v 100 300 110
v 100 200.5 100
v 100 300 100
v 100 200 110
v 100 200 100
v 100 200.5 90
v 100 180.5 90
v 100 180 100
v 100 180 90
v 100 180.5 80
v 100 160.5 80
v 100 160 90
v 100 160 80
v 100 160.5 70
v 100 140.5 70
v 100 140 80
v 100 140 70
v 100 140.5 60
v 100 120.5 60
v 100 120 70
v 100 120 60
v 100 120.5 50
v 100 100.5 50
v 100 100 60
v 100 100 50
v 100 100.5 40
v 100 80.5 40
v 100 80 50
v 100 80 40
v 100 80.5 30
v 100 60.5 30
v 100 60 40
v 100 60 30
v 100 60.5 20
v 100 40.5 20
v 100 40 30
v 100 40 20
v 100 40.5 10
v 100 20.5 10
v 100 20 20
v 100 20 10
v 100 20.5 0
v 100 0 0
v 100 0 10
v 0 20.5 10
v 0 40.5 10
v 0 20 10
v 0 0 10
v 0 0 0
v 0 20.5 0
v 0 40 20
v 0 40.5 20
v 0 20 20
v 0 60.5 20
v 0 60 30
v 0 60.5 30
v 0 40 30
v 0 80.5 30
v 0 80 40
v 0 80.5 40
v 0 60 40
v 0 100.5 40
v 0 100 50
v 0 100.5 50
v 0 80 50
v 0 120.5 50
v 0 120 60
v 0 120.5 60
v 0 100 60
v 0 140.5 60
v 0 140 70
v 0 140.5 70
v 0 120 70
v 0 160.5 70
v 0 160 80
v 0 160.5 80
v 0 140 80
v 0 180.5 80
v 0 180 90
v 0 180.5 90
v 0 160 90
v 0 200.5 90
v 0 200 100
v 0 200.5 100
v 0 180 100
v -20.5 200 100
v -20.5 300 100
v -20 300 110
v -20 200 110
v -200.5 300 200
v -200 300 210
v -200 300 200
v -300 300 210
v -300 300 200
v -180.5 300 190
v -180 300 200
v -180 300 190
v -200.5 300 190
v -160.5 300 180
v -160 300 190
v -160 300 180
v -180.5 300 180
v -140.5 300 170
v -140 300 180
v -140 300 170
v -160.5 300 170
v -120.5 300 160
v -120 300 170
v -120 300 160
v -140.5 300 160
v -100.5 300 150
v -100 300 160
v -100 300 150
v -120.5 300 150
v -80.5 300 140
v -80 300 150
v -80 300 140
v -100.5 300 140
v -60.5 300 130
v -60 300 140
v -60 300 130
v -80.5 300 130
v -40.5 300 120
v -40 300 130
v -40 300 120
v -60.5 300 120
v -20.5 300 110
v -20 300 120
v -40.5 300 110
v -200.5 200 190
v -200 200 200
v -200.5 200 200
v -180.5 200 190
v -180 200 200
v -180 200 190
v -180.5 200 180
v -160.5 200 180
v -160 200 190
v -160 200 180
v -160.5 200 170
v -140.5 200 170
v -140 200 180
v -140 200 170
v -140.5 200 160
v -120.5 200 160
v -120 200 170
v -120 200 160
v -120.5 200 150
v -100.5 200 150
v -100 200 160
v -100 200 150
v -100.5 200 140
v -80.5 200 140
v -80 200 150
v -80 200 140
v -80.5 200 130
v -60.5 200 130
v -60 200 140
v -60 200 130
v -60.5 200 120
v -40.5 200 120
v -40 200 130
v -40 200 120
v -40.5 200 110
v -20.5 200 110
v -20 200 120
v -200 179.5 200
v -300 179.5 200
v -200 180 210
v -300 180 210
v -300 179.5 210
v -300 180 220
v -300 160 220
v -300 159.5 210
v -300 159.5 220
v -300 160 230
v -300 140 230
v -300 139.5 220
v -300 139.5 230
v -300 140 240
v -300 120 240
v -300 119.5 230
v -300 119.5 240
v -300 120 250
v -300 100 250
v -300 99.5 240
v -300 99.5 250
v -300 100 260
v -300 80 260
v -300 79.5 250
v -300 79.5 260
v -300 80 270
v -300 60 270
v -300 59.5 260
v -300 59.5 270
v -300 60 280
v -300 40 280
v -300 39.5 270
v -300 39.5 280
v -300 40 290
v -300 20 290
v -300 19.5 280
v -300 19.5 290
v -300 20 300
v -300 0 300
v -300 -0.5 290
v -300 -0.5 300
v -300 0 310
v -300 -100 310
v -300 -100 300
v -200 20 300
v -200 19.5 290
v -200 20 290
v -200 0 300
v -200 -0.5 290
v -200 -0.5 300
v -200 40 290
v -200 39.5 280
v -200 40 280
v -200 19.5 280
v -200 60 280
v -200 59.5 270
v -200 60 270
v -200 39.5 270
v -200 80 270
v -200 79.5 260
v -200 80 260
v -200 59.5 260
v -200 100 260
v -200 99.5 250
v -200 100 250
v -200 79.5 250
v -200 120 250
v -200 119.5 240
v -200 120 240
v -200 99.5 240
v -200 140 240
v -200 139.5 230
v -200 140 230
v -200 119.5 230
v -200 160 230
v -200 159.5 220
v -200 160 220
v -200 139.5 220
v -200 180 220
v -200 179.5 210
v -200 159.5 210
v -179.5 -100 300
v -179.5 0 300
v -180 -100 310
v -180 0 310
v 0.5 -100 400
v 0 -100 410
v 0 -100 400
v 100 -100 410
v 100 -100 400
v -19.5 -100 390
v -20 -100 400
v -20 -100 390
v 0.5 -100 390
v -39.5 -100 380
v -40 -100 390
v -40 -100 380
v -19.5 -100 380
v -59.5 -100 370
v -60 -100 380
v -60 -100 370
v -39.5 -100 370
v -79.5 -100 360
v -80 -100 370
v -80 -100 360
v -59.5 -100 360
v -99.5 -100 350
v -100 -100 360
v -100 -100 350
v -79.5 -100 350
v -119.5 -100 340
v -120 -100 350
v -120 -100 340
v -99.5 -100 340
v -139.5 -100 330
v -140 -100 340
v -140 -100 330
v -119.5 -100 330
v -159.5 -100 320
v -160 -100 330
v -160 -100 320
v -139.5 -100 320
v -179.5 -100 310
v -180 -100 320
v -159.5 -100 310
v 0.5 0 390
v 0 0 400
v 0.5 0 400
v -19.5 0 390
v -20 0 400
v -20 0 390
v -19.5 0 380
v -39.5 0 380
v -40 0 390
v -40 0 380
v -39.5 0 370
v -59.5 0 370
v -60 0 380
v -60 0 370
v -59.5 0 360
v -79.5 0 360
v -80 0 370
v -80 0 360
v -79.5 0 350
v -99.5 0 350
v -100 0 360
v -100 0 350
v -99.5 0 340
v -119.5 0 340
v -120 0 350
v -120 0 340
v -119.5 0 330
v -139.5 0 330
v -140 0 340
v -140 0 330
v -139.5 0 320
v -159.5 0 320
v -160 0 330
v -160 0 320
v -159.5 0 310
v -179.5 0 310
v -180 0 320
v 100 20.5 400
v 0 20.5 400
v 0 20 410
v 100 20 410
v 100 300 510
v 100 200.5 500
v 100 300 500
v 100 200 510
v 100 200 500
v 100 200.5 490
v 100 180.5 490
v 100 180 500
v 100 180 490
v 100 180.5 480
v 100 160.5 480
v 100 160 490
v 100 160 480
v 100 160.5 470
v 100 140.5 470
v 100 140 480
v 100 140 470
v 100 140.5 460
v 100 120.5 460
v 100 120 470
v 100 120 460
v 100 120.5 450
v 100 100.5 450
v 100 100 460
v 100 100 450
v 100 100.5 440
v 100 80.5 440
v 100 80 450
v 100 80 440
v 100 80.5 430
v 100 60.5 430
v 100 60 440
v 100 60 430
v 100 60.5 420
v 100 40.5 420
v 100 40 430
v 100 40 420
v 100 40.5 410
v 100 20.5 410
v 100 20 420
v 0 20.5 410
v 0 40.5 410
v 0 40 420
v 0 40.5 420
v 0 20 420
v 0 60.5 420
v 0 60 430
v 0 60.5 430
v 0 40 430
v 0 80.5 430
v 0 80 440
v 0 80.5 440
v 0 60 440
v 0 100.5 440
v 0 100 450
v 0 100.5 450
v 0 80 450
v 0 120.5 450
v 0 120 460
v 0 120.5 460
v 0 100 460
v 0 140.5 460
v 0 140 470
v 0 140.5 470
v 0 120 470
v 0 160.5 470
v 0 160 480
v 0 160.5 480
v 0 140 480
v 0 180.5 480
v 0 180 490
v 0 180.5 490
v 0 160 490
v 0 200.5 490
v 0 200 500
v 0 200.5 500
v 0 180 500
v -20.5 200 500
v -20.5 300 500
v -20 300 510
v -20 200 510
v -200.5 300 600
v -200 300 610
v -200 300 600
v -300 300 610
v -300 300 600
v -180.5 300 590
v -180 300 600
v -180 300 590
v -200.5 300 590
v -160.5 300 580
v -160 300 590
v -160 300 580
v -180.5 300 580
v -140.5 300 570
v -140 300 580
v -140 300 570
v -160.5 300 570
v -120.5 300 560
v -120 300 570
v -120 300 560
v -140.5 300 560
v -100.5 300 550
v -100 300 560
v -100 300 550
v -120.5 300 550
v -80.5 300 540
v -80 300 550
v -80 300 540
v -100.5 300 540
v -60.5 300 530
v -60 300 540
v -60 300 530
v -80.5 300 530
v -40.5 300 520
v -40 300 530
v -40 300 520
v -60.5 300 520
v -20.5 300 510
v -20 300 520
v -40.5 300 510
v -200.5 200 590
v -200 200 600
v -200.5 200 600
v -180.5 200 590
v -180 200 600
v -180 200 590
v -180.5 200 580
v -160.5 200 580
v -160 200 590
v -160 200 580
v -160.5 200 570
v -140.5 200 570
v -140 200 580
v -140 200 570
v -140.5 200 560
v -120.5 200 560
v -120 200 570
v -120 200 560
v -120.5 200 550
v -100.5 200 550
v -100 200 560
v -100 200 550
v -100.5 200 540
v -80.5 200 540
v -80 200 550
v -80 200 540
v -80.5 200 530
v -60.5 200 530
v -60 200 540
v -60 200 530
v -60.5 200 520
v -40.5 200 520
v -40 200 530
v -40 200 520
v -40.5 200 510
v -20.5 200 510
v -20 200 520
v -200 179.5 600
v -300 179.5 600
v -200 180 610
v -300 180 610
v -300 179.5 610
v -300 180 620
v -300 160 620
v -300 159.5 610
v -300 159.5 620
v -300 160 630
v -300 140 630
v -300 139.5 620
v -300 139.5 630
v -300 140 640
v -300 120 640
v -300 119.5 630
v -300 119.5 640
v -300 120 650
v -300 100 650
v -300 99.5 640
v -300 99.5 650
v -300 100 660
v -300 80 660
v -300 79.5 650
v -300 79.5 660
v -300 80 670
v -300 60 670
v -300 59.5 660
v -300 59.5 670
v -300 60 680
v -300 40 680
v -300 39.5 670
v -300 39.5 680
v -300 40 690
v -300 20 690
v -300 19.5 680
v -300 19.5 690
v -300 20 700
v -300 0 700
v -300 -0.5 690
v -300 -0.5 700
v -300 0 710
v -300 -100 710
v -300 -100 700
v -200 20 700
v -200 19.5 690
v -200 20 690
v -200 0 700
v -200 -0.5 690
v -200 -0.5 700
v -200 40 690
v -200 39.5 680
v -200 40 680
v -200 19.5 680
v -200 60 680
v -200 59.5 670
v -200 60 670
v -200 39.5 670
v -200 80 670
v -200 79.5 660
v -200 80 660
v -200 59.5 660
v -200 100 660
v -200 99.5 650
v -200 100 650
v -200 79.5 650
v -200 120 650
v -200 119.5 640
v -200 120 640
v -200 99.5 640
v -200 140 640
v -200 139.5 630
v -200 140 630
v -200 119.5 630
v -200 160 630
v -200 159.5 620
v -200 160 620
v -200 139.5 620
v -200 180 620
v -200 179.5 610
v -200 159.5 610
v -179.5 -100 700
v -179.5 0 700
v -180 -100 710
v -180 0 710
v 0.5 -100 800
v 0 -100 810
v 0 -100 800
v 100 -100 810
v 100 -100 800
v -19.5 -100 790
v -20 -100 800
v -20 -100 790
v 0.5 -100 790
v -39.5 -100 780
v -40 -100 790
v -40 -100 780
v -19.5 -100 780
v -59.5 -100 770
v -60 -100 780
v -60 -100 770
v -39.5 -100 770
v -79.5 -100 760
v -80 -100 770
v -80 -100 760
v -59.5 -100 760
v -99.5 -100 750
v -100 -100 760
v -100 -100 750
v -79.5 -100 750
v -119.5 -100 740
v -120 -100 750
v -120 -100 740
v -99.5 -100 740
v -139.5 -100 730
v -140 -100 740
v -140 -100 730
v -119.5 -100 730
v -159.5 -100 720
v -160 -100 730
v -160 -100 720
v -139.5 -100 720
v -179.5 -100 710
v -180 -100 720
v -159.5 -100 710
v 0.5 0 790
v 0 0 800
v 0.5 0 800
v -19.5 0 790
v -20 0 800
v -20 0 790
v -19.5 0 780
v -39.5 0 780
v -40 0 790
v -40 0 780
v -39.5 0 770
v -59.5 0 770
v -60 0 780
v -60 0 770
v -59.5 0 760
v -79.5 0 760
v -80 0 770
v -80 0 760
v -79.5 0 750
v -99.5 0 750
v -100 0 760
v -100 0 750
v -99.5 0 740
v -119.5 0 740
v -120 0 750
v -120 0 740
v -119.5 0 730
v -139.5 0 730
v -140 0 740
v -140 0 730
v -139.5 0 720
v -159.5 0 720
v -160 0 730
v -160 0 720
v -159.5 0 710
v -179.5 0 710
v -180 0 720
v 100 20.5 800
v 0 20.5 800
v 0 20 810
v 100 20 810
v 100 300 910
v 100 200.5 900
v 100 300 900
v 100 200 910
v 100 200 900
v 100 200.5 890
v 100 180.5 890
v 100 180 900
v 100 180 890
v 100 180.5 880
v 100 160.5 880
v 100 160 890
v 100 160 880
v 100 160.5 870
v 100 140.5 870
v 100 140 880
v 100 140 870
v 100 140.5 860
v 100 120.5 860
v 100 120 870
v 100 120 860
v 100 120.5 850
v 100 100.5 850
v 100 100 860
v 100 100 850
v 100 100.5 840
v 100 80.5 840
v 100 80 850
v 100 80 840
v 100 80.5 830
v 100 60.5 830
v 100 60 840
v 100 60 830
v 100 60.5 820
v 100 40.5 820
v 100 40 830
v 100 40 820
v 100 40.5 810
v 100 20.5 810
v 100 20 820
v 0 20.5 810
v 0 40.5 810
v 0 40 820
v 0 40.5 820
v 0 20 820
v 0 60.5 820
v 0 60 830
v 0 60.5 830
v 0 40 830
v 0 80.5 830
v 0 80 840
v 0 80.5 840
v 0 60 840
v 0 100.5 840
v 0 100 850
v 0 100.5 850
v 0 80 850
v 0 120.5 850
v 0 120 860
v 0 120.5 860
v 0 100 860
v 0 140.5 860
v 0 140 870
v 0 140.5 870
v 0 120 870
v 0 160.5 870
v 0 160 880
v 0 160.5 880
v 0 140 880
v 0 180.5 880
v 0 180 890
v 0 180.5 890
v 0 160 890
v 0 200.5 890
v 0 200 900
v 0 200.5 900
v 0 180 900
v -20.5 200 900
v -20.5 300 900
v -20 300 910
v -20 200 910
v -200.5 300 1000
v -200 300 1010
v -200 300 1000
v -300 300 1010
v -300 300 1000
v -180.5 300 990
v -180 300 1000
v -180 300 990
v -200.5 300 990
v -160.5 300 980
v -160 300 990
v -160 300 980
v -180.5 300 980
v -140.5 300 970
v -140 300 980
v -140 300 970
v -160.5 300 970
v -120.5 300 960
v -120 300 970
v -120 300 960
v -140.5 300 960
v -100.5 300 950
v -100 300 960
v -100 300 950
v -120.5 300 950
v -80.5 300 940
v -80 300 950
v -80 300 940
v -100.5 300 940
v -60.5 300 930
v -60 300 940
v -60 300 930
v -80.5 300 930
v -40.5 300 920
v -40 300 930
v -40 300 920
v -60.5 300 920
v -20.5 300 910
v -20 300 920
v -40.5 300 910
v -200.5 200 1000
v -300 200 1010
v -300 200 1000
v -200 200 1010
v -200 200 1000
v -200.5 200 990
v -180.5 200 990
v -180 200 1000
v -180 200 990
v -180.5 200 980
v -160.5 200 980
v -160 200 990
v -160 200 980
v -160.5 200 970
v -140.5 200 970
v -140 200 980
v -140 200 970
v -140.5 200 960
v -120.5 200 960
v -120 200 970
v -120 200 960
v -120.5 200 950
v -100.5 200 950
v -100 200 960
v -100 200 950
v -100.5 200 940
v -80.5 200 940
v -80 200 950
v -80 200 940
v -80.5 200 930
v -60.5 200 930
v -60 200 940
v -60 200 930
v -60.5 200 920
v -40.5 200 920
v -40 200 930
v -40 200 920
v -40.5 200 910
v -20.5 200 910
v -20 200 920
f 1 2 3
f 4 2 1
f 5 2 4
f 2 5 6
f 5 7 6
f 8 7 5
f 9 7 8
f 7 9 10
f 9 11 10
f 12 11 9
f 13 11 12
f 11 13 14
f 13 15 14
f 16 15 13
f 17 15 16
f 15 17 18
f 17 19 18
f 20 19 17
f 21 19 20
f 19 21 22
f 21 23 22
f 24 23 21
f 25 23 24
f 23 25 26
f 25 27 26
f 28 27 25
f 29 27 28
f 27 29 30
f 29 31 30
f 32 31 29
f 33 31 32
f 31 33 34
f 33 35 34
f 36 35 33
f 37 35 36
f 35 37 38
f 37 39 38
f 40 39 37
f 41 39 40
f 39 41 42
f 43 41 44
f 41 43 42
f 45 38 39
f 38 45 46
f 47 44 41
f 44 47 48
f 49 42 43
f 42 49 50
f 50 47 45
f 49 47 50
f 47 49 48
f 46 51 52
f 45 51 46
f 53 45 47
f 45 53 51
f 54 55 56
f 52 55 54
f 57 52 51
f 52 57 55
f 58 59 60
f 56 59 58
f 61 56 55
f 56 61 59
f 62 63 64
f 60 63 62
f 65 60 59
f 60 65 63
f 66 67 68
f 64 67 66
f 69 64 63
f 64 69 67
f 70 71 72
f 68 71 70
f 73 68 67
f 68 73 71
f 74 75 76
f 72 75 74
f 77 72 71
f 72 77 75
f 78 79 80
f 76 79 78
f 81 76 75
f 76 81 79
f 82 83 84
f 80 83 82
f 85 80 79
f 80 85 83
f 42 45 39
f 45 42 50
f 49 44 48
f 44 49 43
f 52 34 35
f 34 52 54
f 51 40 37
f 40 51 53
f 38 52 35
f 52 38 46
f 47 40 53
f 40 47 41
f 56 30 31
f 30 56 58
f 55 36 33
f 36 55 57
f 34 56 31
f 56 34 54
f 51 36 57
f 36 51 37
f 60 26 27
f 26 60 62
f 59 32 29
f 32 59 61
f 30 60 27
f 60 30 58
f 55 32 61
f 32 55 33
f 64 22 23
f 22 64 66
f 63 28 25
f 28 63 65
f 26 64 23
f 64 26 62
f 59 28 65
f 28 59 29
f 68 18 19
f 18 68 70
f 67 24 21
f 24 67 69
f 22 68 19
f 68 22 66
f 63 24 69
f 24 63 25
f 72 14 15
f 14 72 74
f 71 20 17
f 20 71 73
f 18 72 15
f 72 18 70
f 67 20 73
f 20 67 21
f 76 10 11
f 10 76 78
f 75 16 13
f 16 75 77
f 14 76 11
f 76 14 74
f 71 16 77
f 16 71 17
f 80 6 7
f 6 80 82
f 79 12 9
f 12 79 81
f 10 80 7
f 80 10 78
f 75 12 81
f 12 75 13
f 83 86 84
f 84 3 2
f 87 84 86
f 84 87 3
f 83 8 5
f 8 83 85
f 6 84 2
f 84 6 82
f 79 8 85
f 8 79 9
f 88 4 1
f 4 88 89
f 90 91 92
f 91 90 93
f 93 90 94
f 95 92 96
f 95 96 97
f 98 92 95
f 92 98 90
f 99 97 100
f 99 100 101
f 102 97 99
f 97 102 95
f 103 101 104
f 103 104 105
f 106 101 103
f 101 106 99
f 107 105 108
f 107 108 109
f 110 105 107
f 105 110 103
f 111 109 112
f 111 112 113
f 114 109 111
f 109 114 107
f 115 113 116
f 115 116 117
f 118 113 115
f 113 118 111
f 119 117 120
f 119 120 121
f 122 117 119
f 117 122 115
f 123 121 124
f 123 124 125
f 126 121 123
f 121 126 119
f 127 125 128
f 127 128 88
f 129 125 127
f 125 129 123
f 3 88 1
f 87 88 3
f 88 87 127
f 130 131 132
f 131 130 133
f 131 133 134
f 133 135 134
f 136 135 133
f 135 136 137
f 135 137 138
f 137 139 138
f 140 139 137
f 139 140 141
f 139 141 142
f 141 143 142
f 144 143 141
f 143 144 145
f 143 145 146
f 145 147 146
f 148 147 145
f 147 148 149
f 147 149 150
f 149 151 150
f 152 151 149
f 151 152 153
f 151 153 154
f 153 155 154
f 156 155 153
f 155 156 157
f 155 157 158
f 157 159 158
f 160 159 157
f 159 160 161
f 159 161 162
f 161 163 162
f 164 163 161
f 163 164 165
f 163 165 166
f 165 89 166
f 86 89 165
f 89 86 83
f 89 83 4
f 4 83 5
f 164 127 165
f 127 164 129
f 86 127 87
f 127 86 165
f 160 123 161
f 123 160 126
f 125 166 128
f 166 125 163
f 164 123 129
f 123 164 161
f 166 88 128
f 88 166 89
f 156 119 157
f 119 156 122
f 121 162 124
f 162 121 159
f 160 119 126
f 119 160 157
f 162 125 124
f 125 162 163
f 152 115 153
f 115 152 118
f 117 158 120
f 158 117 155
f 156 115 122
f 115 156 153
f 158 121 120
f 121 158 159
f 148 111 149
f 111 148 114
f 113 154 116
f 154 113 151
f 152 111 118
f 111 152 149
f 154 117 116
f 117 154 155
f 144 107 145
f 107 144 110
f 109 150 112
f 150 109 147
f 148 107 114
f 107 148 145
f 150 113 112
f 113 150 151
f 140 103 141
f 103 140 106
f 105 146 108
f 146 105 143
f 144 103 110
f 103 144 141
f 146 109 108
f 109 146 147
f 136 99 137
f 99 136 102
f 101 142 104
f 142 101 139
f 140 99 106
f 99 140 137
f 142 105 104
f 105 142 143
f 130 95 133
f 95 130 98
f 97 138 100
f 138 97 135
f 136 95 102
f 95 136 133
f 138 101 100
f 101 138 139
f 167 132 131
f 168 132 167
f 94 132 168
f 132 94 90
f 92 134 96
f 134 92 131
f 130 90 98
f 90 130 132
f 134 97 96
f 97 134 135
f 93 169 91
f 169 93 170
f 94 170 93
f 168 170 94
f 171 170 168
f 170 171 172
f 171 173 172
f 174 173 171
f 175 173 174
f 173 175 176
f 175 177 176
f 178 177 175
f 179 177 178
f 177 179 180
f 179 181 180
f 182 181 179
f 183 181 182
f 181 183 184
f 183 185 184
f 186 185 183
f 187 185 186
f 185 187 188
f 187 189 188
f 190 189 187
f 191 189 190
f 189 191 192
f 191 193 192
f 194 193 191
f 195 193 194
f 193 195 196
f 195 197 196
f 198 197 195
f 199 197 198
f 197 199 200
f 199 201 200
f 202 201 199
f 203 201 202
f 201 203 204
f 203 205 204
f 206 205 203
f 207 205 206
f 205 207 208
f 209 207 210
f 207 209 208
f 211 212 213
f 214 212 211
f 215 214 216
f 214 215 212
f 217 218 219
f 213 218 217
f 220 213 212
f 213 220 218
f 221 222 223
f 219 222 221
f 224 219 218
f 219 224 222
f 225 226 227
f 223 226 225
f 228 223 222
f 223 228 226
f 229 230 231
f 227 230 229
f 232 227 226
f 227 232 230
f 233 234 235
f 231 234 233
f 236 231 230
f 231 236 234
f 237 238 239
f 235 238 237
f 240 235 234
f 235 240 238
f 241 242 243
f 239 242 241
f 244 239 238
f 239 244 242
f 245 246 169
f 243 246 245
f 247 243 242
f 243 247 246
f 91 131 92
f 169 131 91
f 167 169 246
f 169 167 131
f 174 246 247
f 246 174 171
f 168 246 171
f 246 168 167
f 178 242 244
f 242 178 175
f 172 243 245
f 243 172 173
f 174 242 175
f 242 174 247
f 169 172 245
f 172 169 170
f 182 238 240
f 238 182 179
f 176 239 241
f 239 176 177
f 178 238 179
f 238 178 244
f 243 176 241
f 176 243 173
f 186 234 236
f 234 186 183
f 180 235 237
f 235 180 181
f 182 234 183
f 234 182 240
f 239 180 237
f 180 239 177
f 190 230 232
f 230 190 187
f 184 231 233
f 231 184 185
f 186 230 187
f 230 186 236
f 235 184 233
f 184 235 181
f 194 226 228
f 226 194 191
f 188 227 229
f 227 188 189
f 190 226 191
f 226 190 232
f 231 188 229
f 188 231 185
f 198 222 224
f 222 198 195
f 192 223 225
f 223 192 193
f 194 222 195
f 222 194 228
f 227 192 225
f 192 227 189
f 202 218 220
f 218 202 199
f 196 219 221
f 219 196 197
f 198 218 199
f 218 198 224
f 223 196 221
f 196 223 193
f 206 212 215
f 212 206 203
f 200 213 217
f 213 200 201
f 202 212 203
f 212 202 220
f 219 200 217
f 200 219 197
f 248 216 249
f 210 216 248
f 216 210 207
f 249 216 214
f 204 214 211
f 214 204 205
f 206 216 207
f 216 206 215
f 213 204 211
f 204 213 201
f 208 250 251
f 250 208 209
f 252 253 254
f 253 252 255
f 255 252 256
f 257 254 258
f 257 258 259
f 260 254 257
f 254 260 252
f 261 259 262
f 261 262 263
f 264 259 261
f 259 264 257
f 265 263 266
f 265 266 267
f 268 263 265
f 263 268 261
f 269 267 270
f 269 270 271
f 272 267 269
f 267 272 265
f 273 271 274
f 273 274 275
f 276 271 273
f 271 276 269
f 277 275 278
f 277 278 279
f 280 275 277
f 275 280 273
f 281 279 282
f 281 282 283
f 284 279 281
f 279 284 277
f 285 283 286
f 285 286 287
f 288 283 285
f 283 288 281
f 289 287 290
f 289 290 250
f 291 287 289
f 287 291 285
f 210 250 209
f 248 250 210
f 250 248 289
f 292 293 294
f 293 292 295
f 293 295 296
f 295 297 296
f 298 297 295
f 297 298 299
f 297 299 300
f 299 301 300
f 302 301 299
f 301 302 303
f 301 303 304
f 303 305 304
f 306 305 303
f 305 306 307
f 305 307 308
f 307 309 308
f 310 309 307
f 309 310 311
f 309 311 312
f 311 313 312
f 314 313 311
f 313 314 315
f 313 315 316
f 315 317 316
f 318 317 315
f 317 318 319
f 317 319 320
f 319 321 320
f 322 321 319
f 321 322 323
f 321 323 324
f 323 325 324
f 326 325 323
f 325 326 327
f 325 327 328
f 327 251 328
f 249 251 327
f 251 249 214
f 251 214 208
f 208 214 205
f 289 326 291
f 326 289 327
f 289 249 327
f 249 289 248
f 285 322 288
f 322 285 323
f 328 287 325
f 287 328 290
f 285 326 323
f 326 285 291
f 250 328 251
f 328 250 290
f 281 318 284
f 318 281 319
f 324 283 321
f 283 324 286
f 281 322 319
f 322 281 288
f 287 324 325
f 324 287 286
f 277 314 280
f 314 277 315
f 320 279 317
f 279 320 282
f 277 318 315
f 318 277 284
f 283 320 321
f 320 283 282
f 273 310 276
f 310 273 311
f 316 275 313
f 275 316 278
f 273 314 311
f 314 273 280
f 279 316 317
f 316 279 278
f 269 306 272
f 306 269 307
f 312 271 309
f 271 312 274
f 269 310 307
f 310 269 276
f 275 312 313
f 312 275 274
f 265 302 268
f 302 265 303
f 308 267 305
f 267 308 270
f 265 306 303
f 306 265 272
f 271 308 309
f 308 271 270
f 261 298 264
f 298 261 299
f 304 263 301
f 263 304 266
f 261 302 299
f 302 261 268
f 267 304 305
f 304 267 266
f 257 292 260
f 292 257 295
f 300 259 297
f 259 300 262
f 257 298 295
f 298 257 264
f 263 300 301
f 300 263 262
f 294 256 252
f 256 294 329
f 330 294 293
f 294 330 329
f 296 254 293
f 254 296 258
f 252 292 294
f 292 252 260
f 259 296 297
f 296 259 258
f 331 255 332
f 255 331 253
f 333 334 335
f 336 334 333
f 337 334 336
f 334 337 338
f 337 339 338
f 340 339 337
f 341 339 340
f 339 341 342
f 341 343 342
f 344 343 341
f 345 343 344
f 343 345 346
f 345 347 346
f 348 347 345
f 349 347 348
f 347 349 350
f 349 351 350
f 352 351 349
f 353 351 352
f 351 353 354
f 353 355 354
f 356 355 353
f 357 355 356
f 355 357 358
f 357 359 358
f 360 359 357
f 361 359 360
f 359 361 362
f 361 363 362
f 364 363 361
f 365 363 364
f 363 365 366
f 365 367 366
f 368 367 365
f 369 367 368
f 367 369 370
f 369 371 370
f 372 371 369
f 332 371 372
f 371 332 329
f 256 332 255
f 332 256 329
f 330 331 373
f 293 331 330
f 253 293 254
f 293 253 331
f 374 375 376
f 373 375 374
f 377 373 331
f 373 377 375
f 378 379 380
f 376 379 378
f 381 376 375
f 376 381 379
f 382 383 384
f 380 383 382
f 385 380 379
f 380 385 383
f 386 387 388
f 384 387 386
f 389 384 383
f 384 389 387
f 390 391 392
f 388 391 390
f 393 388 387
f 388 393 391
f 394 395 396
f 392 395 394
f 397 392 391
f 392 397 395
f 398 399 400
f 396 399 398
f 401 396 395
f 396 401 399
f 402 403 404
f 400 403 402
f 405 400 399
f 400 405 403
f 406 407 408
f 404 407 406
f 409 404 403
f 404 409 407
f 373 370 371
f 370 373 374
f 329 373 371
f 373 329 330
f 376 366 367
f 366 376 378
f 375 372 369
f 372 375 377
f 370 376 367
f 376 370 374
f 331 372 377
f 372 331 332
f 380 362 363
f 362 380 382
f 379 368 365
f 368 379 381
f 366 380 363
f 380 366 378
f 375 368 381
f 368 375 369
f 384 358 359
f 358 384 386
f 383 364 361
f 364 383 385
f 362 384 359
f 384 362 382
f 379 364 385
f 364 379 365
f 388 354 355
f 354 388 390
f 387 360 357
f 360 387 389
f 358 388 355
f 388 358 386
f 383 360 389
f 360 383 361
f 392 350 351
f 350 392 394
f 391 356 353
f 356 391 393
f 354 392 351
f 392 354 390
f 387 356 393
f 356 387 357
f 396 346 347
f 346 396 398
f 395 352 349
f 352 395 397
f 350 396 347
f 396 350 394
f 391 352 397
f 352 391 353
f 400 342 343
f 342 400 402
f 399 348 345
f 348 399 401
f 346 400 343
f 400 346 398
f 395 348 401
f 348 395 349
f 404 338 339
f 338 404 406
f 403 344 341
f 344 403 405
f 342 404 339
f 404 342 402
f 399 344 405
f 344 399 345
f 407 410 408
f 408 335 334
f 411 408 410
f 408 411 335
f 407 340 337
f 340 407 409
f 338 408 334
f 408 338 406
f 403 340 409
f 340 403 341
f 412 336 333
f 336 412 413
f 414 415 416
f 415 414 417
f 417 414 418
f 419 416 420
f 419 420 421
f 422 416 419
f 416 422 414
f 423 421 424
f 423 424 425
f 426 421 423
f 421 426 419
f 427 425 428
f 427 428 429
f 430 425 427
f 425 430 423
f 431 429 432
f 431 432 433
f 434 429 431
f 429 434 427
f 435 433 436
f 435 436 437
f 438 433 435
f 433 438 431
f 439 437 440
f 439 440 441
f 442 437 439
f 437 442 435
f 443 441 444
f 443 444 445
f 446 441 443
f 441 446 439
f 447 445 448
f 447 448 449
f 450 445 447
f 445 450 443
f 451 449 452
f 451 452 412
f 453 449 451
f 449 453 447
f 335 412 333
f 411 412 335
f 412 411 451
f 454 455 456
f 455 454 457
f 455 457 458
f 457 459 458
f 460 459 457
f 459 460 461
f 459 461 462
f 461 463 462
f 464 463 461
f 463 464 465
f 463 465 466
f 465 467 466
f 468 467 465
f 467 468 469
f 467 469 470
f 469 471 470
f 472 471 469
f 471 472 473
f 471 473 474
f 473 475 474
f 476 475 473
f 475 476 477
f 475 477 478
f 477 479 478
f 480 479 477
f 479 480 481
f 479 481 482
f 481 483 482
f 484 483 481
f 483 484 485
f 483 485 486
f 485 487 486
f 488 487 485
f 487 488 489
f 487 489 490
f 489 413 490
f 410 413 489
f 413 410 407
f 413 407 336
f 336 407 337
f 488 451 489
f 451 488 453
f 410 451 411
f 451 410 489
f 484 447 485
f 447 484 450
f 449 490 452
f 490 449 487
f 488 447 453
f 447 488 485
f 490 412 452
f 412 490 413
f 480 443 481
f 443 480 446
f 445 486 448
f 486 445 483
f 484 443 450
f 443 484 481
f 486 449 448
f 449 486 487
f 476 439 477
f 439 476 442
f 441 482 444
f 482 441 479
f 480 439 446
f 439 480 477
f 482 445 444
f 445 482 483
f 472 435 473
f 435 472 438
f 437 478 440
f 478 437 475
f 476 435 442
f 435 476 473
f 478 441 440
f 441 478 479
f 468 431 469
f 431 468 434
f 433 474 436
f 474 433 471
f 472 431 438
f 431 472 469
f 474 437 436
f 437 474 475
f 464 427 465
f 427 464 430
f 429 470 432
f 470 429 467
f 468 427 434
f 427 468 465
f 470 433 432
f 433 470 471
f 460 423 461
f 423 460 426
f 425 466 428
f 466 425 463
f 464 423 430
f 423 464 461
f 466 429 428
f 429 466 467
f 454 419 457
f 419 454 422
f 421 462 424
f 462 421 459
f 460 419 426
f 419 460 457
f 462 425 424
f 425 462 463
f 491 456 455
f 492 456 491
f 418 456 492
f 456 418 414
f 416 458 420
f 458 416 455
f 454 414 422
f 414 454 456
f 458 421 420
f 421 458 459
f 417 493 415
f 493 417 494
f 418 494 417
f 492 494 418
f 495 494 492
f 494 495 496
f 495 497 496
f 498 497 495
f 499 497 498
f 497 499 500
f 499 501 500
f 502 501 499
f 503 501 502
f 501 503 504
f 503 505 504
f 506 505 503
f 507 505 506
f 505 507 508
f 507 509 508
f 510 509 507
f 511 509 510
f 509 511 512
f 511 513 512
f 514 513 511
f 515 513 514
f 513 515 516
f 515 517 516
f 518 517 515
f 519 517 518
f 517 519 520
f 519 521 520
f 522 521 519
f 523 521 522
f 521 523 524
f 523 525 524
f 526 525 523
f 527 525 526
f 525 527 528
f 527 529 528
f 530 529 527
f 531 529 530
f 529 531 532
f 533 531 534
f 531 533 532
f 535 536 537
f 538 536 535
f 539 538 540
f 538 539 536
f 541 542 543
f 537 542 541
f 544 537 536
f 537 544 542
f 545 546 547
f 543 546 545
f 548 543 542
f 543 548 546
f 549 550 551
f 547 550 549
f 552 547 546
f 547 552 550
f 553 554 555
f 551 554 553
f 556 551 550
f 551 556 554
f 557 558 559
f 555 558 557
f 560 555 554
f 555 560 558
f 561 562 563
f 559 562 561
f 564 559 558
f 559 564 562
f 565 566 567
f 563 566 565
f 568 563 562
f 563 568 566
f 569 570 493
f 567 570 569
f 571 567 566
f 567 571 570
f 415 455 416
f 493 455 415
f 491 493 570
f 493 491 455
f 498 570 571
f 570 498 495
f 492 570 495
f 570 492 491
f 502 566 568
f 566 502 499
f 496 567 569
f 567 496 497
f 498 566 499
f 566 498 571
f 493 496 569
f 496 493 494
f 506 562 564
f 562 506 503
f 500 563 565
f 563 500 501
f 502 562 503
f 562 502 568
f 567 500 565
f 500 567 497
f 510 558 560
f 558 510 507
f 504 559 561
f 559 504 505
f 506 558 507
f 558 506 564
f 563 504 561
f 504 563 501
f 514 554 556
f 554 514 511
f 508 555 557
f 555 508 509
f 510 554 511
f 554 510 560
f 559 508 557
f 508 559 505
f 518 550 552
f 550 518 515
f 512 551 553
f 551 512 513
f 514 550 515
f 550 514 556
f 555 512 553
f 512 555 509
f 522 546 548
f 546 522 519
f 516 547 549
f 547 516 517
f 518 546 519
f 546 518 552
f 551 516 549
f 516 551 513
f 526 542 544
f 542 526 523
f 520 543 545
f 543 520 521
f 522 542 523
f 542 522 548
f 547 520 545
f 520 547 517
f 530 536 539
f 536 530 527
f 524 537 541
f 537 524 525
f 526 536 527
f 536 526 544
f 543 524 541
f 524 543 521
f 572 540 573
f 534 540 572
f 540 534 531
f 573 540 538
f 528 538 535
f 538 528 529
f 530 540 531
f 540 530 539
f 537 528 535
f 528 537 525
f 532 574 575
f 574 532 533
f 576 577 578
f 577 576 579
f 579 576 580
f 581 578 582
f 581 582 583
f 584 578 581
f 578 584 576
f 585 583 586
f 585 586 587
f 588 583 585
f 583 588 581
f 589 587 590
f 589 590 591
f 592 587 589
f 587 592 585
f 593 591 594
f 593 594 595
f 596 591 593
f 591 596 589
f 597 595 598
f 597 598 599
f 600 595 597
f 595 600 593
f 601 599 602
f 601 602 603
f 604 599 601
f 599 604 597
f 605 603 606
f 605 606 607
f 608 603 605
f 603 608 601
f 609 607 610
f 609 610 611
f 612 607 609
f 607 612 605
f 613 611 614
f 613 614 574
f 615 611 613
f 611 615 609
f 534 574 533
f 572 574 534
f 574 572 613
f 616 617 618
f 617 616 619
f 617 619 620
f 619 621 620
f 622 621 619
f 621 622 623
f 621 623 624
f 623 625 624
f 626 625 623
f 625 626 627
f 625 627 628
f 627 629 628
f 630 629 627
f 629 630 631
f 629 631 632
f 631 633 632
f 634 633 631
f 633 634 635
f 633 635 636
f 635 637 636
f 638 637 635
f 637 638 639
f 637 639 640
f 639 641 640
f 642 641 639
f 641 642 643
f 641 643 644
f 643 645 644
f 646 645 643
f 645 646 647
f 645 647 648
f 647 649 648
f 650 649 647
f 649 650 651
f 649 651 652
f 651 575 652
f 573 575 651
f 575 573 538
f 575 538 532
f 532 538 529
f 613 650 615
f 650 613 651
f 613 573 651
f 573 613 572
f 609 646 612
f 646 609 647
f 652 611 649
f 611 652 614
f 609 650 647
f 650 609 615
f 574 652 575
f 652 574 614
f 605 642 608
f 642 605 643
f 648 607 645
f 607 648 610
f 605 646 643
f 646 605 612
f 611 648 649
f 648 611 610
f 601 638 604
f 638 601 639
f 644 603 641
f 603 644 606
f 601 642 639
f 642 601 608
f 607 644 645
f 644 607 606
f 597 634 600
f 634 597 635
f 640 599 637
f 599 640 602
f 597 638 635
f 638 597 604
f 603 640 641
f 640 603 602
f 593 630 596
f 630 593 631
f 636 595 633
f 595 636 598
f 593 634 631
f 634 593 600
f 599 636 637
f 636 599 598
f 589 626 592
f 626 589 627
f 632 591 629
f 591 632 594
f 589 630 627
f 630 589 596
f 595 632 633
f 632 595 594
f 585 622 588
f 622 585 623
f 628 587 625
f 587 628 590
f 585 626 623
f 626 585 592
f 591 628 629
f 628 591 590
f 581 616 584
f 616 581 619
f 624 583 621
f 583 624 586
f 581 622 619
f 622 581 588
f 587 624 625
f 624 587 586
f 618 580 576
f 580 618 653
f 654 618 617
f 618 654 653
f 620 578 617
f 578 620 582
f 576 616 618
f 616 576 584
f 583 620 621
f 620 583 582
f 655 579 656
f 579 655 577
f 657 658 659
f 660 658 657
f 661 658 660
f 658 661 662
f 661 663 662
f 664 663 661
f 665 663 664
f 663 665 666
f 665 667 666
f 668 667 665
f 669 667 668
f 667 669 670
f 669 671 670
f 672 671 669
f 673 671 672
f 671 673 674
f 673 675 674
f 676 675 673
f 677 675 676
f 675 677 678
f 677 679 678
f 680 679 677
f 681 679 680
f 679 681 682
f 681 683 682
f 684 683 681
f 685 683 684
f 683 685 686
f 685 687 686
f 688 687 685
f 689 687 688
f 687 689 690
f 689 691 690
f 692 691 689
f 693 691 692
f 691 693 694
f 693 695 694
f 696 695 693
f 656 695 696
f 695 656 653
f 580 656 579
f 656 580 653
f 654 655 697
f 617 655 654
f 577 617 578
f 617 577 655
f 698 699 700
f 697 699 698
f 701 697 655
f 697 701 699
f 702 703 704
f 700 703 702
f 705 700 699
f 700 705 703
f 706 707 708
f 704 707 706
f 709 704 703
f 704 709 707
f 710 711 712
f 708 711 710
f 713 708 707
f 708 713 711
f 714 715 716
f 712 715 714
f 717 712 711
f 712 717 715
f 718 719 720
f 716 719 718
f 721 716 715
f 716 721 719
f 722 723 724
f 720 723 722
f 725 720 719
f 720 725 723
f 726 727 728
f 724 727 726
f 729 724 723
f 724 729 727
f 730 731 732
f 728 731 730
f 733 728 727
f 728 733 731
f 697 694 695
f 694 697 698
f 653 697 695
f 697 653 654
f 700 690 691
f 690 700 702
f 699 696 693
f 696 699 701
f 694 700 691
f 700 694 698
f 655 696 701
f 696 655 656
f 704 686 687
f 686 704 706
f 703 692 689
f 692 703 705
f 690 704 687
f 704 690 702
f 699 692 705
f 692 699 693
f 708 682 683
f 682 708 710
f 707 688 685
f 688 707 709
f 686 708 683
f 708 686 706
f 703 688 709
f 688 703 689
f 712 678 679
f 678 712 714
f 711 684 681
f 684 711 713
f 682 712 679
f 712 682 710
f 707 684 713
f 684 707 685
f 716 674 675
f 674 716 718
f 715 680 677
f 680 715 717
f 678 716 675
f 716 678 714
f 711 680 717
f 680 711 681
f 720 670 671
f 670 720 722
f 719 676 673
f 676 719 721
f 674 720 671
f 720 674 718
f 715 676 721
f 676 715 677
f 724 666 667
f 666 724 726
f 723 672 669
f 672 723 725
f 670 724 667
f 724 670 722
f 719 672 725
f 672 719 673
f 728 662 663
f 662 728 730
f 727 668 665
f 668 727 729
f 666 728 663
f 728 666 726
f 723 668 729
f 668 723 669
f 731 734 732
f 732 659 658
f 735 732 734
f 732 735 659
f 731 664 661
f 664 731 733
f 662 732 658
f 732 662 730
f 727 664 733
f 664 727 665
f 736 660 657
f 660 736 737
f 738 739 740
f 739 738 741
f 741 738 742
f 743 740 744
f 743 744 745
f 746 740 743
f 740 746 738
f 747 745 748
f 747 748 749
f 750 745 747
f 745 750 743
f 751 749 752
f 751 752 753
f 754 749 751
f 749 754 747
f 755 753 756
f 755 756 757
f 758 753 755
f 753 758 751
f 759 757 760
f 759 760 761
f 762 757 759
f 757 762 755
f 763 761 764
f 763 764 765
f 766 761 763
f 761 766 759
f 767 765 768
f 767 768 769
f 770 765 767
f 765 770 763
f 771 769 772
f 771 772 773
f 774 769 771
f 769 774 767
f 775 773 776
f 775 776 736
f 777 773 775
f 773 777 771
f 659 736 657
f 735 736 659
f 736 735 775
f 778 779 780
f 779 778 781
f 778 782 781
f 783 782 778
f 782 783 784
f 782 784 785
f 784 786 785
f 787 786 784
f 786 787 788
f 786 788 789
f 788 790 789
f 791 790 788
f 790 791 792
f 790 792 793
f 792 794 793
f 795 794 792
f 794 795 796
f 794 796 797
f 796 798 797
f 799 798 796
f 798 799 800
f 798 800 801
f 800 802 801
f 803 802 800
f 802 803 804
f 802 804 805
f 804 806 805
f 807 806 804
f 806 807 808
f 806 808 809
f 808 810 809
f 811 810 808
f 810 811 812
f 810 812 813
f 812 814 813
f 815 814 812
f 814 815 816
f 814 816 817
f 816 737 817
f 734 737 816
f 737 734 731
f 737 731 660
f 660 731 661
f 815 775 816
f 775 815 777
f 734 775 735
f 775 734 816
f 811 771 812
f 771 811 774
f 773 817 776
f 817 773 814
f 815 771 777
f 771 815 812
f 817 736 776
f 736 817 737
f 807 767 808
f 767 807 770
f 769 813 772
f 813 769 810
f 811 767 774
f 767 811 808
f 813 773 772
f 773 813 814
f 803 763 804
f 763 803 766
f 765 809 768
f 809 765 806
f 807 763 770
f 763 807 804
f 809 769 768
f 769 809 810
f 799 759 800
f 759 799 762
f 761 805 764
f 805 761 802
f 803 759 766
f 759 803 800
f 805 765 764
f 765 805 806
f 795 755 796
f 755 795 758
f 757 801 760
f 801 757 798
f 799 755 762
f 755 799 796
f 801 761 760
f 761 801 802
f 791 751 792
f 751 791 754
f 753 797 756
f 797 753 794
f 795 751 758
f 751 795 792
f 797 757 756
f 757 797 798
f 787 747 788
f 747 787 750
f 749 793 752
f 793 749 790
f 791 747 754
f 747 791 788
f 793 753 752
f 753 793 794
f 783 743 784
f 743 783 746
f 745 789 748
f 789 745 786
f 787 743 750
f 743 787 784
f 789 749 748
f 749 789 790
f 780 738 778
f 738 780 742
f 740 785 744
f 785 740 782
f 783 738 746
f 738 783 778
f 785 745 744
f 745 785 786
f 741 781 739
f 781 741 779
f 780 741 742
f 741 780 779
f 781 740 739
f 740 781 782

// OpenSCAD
module step(number){
    rotation = [0, 0, 0];
    translation = [0, number * 20, number * 10];
    translate(translation) rotate(rotation) {
        cube([100, 20.5, 10]);
    }
}

module stair(steps=1){
    for(i=[0:1:steps-1]){
        step(i);
    }
    translate([0,steps * 20, steps* 10]){
       cube([100, 100, 10]);
    }
}

module stairwell(stores=2){
    for(i=[0:1:stores-1]){
        rotateZ = i * 90 % 360;
        
        if(rotateZ == 0){
            translate([0,0,i*100]) stair(10);
        }else{
            rotation = [0, 0, rotateZ];
            if(rotateZ == 90){
                translate([0,200,i*100]) rotate(rotation){
                    stair(10);
                }
            }else if(rotateZ == 180){
                translate([-200,200,i*100]) rotate(rotation){
                    stair(10);
                }
            }else if(rotateZ == 270) {
                translate([-200,0,i*100]) rotate(rotation){
                    stair(10);
                }
            }
        }
    }
}

stairwell(10);
